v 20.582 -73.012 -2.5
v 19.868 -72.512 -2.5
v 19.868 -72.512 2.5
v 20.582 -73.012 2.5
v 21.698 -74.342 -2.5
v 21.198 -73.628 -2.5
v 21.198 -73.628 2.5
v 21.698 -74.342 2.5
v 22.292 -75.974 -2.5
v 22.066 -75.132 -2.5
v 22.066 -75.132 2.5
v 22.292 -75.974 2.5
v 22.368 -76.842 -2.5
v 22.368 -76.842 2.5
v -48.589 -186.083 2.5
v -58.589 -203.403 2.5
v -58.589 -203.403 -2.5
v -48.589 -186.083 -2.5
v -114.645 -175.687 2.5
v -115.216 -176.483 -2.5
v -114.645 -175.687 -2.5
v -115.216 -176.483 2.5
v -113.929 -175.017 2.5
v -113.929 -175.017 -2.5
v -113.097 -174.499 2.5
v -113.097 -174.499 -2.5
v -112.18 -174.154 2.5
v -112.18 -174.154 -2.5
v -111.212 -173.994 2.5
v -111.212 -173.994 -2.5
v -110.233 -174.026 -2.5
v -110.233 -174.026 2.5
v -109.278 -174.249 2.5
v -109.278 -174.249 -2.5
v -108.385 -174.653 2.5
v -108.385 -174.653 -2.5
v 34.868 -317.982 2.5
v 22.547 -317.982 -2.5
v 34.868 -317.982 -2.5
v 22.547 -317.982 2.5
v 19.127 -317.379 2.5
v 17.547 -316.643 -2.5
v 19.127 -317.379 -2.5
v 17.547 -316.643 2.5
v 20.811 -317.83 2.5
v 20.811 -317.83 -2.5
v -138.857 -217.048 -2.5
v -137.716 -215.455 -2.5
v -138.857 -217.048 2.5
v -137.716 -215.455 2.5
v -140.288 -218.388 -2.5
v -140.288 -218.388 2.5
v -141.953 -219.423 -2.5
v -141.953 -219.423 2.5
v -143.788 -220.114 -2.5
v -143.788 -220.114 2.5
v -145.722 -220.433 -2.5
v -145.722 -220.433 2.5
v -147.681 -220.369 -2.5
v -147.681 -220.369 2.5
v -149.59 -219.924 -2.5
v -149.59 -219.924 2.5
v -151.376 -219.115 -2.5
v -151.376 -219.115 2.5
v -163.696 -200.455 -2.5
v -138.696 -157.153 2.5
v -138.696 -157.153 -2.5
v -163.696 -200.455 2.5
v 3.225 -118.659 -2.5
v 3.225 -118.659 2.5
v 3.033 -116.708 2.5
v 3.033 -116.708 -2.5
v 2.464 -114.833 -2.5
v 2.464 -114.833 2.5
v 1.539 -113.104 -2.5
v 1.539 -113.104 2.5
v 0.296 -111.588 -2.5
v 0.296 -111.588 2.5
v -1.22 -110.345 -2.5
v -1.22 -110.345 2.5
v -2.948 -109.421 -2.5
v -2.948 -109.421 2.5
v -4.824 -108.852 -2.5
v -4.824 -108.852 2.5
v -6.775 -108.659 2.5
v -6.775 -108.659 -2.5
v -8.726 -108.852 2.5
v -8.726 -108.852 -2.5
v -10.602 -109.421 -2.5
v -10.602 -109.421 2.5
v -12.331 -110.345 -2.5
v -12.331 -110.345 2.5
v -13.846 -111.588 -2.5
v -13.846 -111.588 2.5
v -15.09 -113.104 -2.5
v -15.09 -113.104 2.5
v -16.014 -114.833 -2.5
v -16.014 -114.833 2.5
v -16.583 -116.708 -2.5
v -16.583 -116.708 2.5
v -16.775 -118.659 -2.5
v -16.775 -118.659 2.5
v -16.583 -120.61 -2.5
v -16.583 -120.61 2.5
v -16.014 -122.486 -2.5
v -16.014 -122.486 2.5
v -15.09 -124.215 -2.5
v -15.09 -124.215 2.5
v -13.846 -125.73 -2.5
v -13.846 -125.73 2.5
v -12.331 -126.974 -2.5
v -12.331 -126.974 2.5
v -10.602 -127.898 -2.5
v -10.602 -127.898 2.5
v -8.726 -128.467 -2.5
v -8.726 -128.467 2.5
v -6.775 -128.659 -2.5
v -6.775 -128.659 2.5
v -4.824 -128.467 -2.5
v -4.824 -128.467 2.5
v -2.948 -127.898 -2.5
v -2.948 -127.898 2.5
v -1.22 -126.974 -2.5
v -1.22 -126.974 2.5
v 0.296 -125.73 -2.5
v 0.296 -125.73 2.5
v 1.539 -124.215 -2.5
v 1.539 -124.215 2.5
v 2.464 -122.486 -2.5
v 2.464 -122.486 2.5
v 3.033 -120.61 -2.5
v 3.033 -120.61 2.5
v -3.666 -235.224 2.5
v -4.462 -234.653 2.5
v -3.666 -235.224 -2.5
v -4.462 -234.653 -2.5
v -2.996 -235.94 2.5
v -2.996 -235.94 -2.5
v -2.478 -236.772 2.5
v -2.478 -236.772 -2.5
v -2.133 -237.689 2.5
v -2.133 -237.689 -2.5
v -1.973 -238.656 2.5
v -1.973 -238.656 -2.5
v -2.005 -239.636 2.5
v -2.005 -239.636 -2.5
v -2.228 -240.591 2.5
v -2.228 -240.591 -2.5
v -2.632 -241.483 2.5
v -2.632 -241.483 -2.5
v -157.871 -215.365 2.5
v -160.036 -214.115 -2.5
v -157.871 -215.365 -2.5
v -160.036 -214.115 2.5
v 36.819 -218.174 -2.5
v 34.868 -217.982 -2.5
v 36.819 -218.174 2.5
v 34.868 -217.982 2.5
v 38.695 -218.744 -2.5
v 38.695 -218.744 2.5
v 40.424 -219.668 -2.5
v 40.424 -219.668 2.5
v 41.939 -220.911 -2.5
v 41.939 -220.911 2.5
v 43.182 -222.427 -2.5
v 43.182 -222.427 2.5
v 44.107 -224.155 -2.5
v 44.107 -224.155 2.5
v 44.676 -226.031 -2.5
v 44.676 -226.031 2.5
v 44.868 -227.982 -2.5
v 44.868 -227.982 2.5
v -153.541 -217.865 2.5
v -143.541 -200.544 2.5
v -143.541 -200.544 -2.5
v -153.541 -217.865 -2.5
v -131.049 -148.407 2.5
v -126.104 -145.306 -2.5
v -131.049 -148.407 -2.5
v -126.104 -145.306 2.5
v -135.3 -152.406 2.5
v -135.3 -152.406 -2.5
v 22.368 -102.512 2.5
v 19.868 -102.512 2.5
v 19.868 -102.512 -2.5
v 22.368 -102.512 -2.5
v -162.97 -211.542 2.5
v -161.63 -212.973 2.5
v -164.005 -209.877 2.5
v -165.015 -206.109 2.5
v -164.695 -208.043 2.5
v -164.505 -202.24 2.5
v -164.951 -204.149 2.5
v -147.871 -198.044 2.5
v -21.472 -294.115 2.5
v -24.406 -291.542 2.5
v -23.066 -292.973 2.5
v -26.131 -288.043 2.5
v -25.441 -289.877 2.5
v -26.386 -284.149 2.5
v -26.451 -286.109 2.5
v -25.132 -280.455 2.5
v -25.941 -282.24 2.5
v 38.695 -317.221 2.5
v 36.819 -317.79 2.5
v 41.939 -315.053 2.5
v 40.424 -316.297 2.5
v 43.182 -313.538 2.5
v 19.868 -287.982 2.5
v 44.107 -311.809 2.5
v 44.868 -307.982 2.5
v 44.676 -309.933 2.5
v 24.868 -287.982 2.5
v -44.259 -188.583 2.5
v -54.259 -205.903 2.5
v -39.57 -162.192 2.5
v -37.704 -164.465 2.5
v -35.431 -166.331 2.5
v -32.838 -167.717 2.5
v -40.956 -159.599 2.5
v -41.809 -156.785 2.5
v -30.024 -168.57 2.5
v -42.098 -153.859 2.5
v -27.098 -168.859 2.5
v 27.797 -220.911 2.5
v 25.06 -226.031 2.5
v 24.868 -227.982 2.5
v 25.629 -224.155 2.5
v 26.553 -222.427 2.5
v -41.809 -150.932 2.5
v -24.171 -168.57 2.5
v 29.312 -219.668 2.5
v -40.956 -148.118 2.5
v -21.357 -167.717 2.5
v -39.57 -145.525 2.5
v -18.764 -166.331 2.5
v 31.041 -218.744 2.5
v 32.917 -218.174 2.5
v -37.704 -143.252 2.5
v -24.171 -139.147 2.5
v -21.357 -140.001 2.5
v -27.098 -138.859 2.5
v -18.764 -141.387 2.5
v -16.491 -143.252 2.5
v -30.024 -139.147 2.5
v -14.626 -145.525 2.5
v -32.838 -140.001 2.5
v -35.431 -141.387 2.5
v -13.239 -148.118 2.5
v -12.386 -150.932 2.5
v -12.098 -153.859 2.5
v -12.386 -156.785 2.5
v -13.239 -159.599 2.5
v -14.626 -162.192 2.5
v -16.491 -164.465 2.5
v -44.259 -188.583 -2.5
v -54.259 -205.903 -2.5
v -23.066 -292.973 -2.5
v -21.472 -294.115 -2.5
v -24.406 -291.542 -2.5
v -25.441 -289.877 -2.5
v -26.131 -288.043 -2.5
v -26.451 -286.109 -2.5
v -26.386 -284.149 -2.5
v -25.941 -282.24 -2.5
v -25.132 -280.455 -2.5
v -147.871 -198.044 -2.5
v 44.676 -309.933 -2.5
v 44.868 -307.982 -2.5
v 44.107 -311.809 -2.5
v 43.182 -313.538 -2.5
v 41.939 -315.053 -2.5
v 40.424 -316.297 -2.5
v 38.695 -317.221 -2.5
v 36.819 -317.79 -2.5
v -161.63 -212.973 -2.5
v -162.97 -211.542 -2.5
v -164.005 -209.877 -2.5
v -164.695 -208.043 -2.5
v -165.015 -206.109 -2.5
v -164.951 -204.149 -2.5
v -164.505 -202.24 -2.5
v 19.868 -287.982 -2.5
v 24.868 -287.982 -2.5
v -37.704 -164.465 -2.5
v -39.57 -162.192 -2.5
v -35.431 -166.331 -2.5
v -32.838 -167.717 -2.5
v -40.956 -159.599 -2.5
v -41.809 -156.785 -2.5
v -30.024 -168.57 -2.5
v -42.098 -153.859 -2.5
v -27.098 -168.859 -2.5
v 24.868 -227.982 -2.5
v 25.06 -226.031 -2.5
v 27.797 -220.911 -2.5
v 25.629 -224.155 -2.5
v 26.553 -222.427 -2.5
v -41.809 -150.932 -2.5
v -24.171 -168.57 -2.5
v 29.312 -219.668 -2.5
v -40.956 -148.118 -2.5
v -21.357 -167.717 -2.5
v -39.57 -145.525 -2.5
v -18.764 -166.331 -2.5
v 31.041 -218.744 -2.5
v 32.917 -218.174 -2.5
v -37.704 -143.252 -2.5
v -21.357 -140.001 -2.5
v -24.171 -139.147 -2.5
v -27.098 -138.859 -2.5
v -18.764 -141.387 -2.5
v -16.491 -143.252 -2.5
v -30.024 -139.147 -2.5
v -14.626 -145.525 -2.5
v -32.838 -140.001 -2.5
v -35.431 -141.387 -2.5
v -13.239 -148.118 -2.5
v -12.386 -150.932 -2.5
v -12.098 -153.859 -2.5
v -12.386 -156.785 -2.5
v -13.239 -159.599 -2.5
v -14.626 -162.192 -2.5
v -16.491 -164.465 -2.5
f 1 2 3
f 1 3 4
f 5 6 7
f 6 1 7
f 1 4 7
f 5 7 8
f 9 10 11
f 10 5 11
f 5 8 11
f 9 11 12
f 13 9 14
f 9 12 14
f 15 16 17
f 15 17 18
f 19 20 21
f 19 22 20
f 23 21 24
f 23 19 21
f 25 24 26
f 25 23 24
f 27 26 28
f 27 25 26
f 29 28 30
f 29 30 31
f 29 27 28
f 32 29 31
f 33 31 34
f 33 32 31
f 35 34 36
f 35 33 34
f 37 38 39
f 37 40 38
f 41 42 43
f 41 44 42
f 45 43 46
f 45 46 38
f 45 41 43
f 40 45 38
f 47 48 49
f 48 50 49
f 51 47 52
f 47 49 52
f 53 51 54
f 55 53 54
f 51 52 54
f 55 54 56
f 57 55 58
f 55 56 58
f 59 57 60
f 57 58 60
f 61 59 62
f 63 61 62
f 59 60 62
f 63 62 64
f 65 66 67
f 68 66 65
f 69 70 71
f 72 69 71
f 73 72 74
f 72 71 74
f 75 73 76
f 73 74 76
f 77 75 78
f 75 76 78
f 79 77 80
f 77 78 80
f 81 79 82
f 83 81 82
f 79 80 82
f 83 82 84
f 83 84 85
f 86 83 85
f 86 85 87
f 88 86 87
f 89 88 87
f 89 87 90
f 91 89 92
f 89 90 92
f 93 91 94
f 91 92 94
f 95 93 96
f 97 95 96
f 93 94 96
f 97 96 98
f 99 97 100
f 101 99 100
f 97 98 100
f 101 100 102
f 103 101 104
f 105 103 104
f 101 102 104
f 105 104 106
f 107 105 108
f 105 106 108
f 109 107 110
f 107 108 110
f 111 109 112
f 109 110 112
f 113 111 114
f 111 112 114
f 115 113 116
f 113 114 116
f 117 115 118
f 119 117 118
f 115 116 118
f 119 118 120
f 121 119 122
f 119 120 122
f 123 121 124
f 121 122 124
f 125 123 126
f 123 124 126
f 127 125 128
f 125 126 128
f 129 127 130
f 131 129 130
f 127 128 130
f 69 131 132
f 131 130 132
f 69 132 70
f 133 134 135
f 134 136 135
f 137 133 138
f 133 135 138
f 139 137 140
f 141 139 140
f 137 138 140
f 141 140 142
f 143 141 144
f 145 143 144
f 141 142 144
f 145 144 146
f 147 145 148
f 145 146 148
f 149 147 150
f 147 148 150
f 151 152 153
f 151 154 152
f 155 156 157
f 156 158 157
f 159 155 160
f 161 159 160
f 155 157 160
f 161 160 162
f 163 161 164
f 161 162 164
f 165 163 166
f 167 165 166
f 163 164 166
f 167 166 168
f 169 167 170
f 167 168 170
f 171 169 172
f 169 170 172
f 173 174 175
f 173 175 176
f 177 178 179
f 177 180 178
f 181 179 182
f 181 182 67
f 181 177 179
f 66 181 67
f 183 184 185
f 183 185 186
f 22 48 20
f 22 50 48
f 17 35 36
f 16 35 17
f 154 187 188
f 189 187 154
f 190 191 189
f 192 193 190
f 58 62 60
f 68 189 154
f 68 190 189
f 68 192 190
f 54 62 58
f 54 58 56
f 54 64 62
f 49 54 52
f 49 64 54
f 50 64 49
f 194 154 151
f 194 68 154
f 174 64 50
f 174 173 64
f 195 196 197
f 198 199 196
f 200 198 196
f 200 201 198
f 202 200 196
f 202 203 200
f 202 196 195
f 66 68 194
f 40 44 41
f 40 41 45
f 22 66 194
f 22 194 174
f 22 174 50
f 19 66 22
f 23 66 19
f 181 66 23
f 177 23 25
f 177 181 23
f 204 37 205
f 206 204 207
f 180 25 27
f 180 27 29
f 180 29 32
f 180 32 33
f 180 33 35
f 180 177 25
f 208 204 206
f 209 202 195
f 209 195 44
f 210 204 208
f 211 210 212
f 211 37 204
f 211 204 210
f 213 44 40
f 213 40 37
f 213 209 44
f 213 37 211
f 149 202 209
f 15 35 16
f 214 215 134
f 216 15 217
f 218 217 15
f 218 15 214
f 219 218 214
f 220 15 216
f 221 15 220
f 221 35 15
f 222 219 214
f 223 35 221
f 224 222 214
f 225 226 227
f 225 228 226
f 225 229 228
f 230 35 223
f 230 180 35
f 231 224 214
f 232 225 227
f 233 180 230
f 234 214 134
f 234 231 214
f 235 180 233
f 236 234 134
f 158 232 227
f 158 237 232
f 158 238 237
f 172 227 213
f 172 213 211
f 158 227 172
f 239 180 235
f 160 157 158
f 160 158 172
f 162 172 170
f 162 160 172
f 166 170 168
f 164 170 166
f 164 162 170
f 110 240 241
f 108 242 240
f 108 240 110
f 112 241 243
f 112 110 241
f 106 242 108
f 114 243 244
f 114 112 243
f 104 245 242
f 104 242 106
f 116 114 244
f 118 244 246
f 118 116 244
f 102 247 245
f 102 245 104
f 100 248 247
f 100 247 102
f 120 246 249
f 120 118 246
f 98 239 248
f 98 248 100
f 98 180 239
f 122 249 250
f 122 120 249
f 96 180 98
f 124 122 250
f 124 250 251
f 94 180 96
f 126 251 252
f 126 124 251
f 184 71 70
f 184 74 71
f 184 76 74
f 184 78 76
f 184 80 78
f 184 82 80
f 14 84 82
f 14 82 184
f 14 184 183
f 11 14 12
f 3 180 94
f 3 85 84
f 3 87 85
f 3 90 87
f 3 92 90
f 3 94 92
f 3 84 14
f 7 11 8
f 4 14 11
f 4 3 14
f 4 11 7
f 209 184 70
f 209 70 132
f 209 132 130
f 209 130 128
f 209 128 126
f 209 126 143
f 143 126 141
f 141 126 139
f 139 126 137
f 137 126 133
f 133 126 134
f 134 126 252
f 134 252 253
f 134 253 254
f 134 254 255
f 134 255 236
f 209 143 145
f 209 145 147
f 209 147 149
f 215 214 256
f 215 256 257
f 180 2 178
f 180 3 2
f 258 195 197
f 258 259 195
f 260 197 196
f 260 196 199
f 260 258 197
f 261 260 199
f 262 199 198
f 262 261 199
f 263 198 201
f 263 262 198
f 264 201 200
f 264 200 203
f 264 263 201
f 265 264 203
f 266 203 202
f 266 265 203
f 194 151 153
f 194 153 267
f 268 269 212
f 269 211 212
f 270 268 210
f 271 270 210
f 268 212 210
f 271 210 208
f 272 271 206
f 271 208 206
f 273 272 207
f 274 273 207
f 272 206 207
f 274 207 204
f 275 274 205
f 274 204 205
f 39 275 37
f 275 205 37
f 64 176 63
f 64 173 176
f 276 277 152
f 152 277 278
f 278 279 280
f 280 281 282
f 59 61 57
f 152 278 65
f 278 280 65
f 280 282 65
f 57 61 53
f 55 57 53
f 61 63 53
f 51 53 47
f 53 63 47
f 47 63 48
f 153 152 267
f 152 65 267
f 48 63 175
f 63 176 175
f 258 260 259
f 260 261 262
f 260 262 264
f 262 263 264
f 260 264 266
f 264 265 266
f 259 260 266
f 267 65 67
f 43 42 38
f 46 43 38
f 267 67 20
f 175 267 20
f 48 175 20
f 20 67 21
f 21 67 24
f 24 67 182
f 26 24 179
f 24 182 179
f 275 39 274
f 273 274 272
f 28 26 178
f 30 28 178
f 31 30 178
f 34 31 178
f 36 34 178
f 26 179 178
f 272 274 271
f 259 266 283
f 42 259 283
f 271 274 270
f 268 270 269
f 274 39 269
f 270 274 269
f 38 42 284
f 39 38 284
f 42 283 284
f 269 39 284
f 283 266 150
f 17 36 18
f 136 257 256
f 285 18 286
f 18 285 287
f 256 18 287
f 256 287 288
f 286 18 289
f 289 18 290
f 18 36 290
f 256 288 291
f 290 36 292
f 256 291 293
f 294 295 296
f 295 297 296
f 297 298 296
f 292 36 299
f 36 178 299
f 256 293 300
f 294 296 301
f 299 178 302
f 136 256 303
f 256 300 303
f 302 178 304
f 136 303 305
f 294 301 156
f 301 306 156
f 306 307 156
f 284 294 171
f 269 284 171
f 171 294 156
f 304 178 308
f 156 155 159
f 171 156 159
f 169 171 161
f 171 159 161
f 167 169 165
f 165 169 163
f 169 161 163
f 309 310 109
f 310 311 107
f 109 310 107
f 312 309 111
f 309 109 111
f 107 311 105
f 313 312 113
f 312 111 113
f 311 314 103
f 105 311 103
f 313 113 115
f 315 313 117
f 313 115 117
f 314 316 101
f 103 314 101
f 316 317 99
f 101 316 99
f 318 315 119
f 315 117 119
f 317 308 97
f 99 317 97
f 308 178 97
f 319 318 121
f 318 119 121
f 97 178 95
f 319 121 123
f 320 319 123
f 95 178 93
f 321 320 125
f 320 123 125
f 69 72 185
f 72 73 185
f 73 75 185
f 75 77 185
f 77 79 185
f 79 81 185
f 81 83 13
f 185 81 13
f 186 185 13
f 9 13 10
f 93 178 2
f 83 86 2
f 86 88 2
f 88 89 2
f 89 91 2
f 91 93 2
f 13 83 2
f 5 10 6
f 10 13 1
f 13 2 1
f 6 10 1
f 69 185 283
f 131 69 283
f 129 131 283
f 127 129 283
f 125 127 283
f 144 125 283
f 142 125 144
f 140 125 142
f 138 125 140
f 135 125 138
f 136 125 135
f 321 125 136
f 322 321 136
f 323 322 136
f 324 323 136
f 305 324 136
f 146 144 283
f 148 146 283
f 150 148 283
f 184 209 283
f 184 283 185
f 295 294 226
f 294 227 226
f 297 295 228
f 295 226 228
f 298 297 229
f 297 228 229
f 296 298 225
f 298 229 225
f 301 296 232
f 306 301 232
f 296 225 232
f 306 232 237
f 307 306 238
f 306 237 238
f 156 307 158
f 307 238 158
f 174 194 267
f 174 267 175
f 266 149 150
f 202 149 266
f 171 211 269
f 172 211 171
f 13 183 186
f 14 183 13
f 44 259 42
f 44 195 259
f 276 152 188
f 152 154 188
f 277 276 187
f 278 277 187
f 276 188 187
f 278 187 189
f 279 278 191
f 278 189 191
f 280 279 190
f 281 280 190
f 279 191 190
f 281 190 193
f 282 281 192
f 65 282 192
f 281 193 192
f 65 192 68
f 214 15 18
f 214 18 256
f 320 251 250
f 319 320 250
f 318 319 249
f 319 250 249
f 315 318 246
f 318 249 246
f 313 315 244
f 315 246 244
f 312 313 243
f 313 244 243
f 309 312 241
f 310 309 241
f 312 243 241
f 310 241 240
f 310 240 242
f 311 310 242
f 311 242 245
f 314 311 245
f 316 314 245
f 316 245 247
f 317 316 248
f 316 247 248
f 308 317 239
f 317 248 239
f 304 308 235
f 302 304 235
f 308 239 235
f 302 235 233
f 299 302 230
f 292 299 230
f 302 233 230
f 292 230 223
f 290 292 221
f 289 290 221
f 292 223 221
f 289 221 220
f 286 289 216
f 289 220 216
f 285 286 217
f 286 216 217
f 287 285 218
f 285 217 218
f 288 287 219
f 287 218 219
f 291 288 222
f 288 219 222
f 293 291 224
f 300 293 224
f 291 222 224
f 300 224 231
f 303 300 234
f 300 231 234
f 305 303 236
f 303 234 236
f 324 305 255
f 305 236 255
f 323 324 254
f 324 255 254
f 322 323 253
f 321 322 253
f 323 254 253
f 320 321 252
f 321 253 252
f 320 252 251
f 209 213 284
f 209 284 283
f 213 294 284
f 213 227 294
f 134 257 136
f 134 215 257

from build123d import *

# Parameters (mm, degrees)
BOSS_EXTRUDE1_DEPTH = 2.5
FILLET1_R           = 10
SKETCH2_W           = 2.5
SKETCH2_H           = 30
BOSS_EXTRUDE2_DEPTH = 5
FILLET2_R           = 5
SKETCH3_R           = 15
SKETCH3_R_2         = 10
CUT_EXTRUDE1_DEPTH  = 5
FILLET3_R           = 30
FILLET4_R           = 5


# Some blends are built 0.0001 mm under size
with BuildPart() as part:
    # Sketch1 → Boss-Extrude1 (new, symmetric)
    with BuildSketch(Plane.XY):
        Polygon((-30.132236367, -289.114804685), (19.867763633, -317.982318144), (44.867763633, -317.982318144), (44.867763633, -217.982318144), (24.867763633, -217.982318144), (24.867763633, -287.982318144), (19.867763633, -287.982318144), (19.867763633, -72.512264306), (-134.182504853, -149.335156244), (-168.696300973, -209.114804685), (-157.870983425, -215.364804685), (-147.870983425, -198.044296609), (-143.540856406, -200.544296609), (-153.540856406, -217.864804685), (-142.715538859, -224.114804685), (-112.715538859, -172.153280458), (-58.588951122, -203.403280458), (-48.588951122, -186.082772382), (-44.258824104, -188.582772382), (-54.258824104, -205.903280458), (-0.132236367, -237.153280458), align=None)
    extrude(amount=BOSS_EXTRUDE1_DEPTH, both=True)

    # Fillet1
    fillet1_edges = [part.edges().sort_by_distance(p)[0] for p in [
        (-168.696300973, -209.114804685, 0),
        (-142.715538859, -224.114804685, 0),
        (-30.132236367, -289.114804685, 0),
        (19.867763633, -317.982318144, 0),
        (24.867763633, -217.982318144, 0),
        (44.867763633, -217.982318144, 0),
        (44.867763633, -317.982318144, 0),
    ]]
    fillet(fillet1_edges, radius=FILLET1_R - 0.0001)  # a hair under: the kernel refuses the full size

    # Sketch2 → Boss-Extrude2 (add)
    with BuildSketch(Plane.XY.offset(2.5)):
        with Locations((21.117763633, -87.512264306)):
            Rectangle(SKETCH2_W, SKETCH2_H)
    extrude(amount=-BOSS_EXTRUDE2_DEPTH)

    # Fillet2
    # the kernel refuses this fillet: 5 mm, written as the material it takes off along each edge
    with BuildSketch(Plane(origin=(22.367763633, -72.512264306, 13.325317547), x_dir=(-1, 0, 0), z_dir=(0, 0, -1))) as fillet2_piece_1:
        with BuildLine():
            CenterArc((5, -4.330127019), FILLET2_R, 120, 60)
            Line((0, -4.330127019), (-0.1, -4.330127019))
            Line((-0.1, -4.330127019), (-0.1, 0))
            Line((-0.1, 0), (0, 0.1))
            ThreePointArc((0, 0.1), (1.25, 0.1), (2.45, 0.08660254))
            Line((2.45, 0.08660254), (2.5, 0))
        make_face()
    extrude(amount=26.650635095, mode=Mode.SUBTRACT)

    # Sketch3 → Cut-Extrude1 (cut)
    with BuildSketch(Plane.XY.offset(2.5)):
        with Locations((-27.097618997, -153.858693218)):
            Circle(SKETCH3_R)
        with Locations((-6.775273551, -118.659358377)):
            Circle(SKETCH3_R_2)
    extrude(amount=-CUT_EXTRUDE1_DEPTH, mode=Mode.SUBTRACT)

    # Fillet3
    fillet3_edges = [part.edges().sort_by_distance(p)[0] for p in [
        (-134.182504853, -149.335156244, 0),
    ]]
    fillet(fillet3_edges, radius=FILLET3_R)

    # Fillet4
    fillet4_edges = [part.edges().sort_by_distance(p)[0] for p in [
        (-112.715538859, -172.153280458, 0),
        (-0.132236367, -237.153280458, 0),
    ]]
    fillet(fillet4_edges, radius=FILLET4_R)


solid = part.part
